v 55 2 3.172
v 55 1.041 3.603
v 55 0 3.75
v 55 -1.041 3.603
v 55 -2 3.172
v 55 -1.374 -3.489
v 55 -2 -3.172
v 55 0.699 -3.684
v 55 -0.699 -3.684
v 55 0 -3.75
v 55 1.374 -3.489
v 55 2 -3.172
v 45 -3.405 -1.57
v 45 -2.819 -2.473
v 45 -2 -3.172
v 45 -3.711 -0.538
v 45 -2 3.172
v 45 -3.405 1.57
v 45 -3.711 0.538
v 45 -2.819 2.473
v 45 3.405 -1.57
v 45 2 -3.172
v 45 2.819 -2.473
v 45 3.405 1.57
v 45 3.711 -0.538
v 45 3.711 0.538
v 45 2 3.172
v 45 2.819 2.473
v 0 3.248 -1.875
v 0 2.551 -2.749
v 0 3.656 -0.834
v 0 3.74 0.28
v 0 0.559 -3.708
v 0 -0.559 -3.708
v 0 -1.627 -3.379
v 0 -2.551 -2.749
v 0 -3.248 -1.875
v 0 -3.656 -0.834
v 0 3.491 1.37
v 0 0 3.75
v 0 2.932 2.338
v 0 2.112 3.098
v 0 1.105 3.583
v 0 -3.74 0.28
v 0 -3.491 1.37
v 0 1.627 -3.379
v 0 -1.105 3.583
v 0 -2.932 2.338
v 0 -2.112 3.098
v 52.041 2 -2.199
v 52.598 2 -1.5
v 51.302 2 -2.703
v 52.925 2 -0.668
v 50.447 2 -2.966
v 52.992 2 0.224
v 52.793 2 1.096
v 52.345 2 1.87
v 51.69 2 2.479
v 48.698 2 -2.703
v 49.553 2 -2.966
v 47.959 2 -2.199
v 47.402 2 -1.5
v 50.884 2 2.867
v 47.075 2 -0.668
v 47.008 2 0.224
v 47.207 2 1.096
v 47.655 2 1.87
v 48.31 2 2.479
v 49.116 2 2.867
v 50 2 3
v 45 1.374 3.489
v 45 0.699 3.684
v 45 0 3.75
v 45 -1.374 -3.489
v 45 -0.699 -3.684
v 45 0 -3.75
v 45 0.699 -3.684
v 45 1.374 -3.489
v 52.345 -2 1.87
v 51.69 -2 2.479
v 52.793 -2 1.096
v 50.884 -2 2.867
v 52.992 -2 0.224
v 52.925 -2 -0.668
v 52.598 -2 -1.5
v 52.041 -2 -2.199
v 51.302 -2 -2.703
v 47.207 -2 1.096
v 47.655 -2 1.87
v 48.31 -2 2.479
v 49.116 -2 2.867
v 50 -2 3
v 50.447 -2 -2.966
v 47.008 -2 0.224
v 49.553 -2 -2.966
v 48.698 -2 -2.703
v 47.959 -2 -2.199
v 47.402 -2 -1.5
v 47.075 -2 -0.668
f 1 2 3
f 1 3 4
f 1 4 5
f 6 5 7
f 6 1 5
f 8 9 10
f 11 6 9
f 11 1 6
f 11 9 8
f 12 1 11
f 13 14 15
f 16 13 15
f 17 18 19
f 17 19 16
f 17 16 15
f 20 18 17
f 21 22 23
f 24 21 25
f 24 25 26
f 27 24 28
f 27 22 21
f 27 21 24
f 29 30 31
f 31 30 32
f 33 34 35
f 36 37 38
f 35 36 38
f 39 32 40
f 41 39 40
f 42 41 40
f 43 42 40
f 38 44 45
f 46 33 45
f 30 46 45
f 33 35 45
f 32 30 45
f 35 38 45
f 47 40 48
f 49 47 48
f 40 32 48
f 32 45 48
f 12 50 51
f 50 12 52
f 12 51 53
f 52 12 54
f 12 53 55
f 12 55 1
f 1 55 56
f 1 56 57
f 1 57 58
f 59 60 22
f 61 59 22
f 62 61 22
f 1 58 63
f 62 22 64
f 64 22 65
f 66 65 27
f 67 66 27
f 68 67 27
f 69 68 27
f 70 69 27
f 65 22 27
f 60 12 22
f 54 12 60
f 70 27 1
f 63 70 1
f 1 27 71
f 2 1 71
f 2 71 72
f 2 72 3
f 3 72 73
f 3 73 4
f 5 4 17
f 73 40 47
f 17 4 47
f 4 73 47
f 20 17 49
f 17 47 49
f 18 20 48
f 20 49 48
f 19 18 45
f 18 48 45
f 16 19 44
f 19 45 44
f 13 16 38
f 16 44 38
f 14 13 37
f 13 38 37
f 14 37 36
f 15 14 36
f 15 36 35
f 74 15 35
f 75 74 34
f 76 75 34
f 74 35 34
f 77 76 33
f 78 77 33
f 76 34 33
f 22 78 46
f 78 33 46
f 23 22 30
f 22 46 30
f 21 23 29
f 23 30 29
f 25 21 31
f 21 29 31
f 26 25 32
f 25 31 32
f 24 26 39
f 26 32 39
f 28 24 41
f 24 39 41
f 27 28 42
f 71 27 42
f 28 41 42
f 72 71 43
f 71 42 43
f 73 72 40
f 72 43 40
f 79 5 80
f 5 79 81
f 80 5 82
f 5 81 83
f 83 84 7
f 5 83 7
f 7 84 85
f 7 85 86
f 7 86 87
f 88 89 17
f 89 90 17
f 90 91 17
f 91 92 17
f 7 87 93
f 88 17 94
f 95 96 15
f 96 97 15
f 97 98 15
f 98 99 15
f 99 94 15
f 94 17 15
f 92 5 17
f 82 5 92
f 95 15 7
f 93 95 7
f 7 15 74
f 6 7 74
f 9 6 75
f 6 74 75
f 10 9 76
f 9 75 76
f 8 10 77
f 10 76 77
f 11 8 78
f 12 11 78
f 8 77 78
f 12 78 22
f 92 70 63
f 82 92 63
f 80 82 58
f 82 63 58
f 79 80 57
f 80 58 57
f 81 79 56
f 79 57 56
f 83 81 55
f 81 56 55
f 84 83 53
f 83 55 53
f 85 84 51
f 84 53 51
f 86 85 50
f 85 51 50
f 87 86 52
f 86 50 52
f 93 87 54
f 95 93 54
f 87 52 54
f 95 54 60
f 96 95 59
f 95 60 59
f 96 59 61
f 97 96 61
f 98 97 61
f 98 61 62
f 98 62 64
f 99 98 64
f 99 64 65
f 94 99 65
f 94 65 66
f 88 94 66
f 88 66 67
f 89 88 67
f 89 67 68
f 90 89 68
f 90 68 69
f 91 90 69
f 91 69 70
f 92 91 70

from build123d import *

# Parameters (mm, degrees)
SKETCH1_R           = 3.75
BOSS_EXTRUDE1_DEPTH = 45
BOSS_EXTRUDE2_DEPTH = 10
SKETCH3_R           = 3
CUT_EXTRUDE1_DEPTH  = 10


with BuildPart() as part:
    # Sketch1 → Boss-Extrude1 (new body)
    with BuildSketch(Plane(origin=(0, 0, 0), x_dir=(0, 0, -1), z_dir=(1, 0, 0))):
        with Locations(Location((0, 0, 0), (0, 0, 180))):
            Circle(SKETCH1_R)
    extrude(amount=BOSS_EXTRUDE1_DEPTH)

    # Sketch2 → Boss-Extrude2 (add)
    with BuildSketch(Plane(origin=(45, 0, 0), x_dir=(0, 0, -1), z_dir=(1, 0, 0))):
        with BuildLine():
            Line((3.172144385, 2), (0, 2))
            Line((0, 2), (-3.172144385, 2))
            ThreePointArc((-3.172144385, 2), (-3.75, 0), (-3.172144385, -2))
            Line((-3.172144385, -2), (3.172144385, -2))
            ThreePointArc((3.172144385, -2), (3.602640798, -1.040903107), (3.75, 0))
            ThreePointArc((3.75, 0), (3.602640798, 1.040903107), (3.172144385, 2))
        make_face()
    extrude(amount=BOSS_EXTRUDE2_DEPTH)

    # Sketch3 → Cut-Extrude1 (cut)
    with BuildSketch(Plane(origin=(0, 2, 0), x_dir=(1, 0, 0), z_dir=(0, 1, 0))):
        with Locations(Location((50, 0, 0), (0, 0, 270))):
            Circle(SKETCH3_R)
    extrude(amount=-CUT_EXTRUDE1_DEPTH, mode=Mode.SUBTRACT)


solid = part.part
